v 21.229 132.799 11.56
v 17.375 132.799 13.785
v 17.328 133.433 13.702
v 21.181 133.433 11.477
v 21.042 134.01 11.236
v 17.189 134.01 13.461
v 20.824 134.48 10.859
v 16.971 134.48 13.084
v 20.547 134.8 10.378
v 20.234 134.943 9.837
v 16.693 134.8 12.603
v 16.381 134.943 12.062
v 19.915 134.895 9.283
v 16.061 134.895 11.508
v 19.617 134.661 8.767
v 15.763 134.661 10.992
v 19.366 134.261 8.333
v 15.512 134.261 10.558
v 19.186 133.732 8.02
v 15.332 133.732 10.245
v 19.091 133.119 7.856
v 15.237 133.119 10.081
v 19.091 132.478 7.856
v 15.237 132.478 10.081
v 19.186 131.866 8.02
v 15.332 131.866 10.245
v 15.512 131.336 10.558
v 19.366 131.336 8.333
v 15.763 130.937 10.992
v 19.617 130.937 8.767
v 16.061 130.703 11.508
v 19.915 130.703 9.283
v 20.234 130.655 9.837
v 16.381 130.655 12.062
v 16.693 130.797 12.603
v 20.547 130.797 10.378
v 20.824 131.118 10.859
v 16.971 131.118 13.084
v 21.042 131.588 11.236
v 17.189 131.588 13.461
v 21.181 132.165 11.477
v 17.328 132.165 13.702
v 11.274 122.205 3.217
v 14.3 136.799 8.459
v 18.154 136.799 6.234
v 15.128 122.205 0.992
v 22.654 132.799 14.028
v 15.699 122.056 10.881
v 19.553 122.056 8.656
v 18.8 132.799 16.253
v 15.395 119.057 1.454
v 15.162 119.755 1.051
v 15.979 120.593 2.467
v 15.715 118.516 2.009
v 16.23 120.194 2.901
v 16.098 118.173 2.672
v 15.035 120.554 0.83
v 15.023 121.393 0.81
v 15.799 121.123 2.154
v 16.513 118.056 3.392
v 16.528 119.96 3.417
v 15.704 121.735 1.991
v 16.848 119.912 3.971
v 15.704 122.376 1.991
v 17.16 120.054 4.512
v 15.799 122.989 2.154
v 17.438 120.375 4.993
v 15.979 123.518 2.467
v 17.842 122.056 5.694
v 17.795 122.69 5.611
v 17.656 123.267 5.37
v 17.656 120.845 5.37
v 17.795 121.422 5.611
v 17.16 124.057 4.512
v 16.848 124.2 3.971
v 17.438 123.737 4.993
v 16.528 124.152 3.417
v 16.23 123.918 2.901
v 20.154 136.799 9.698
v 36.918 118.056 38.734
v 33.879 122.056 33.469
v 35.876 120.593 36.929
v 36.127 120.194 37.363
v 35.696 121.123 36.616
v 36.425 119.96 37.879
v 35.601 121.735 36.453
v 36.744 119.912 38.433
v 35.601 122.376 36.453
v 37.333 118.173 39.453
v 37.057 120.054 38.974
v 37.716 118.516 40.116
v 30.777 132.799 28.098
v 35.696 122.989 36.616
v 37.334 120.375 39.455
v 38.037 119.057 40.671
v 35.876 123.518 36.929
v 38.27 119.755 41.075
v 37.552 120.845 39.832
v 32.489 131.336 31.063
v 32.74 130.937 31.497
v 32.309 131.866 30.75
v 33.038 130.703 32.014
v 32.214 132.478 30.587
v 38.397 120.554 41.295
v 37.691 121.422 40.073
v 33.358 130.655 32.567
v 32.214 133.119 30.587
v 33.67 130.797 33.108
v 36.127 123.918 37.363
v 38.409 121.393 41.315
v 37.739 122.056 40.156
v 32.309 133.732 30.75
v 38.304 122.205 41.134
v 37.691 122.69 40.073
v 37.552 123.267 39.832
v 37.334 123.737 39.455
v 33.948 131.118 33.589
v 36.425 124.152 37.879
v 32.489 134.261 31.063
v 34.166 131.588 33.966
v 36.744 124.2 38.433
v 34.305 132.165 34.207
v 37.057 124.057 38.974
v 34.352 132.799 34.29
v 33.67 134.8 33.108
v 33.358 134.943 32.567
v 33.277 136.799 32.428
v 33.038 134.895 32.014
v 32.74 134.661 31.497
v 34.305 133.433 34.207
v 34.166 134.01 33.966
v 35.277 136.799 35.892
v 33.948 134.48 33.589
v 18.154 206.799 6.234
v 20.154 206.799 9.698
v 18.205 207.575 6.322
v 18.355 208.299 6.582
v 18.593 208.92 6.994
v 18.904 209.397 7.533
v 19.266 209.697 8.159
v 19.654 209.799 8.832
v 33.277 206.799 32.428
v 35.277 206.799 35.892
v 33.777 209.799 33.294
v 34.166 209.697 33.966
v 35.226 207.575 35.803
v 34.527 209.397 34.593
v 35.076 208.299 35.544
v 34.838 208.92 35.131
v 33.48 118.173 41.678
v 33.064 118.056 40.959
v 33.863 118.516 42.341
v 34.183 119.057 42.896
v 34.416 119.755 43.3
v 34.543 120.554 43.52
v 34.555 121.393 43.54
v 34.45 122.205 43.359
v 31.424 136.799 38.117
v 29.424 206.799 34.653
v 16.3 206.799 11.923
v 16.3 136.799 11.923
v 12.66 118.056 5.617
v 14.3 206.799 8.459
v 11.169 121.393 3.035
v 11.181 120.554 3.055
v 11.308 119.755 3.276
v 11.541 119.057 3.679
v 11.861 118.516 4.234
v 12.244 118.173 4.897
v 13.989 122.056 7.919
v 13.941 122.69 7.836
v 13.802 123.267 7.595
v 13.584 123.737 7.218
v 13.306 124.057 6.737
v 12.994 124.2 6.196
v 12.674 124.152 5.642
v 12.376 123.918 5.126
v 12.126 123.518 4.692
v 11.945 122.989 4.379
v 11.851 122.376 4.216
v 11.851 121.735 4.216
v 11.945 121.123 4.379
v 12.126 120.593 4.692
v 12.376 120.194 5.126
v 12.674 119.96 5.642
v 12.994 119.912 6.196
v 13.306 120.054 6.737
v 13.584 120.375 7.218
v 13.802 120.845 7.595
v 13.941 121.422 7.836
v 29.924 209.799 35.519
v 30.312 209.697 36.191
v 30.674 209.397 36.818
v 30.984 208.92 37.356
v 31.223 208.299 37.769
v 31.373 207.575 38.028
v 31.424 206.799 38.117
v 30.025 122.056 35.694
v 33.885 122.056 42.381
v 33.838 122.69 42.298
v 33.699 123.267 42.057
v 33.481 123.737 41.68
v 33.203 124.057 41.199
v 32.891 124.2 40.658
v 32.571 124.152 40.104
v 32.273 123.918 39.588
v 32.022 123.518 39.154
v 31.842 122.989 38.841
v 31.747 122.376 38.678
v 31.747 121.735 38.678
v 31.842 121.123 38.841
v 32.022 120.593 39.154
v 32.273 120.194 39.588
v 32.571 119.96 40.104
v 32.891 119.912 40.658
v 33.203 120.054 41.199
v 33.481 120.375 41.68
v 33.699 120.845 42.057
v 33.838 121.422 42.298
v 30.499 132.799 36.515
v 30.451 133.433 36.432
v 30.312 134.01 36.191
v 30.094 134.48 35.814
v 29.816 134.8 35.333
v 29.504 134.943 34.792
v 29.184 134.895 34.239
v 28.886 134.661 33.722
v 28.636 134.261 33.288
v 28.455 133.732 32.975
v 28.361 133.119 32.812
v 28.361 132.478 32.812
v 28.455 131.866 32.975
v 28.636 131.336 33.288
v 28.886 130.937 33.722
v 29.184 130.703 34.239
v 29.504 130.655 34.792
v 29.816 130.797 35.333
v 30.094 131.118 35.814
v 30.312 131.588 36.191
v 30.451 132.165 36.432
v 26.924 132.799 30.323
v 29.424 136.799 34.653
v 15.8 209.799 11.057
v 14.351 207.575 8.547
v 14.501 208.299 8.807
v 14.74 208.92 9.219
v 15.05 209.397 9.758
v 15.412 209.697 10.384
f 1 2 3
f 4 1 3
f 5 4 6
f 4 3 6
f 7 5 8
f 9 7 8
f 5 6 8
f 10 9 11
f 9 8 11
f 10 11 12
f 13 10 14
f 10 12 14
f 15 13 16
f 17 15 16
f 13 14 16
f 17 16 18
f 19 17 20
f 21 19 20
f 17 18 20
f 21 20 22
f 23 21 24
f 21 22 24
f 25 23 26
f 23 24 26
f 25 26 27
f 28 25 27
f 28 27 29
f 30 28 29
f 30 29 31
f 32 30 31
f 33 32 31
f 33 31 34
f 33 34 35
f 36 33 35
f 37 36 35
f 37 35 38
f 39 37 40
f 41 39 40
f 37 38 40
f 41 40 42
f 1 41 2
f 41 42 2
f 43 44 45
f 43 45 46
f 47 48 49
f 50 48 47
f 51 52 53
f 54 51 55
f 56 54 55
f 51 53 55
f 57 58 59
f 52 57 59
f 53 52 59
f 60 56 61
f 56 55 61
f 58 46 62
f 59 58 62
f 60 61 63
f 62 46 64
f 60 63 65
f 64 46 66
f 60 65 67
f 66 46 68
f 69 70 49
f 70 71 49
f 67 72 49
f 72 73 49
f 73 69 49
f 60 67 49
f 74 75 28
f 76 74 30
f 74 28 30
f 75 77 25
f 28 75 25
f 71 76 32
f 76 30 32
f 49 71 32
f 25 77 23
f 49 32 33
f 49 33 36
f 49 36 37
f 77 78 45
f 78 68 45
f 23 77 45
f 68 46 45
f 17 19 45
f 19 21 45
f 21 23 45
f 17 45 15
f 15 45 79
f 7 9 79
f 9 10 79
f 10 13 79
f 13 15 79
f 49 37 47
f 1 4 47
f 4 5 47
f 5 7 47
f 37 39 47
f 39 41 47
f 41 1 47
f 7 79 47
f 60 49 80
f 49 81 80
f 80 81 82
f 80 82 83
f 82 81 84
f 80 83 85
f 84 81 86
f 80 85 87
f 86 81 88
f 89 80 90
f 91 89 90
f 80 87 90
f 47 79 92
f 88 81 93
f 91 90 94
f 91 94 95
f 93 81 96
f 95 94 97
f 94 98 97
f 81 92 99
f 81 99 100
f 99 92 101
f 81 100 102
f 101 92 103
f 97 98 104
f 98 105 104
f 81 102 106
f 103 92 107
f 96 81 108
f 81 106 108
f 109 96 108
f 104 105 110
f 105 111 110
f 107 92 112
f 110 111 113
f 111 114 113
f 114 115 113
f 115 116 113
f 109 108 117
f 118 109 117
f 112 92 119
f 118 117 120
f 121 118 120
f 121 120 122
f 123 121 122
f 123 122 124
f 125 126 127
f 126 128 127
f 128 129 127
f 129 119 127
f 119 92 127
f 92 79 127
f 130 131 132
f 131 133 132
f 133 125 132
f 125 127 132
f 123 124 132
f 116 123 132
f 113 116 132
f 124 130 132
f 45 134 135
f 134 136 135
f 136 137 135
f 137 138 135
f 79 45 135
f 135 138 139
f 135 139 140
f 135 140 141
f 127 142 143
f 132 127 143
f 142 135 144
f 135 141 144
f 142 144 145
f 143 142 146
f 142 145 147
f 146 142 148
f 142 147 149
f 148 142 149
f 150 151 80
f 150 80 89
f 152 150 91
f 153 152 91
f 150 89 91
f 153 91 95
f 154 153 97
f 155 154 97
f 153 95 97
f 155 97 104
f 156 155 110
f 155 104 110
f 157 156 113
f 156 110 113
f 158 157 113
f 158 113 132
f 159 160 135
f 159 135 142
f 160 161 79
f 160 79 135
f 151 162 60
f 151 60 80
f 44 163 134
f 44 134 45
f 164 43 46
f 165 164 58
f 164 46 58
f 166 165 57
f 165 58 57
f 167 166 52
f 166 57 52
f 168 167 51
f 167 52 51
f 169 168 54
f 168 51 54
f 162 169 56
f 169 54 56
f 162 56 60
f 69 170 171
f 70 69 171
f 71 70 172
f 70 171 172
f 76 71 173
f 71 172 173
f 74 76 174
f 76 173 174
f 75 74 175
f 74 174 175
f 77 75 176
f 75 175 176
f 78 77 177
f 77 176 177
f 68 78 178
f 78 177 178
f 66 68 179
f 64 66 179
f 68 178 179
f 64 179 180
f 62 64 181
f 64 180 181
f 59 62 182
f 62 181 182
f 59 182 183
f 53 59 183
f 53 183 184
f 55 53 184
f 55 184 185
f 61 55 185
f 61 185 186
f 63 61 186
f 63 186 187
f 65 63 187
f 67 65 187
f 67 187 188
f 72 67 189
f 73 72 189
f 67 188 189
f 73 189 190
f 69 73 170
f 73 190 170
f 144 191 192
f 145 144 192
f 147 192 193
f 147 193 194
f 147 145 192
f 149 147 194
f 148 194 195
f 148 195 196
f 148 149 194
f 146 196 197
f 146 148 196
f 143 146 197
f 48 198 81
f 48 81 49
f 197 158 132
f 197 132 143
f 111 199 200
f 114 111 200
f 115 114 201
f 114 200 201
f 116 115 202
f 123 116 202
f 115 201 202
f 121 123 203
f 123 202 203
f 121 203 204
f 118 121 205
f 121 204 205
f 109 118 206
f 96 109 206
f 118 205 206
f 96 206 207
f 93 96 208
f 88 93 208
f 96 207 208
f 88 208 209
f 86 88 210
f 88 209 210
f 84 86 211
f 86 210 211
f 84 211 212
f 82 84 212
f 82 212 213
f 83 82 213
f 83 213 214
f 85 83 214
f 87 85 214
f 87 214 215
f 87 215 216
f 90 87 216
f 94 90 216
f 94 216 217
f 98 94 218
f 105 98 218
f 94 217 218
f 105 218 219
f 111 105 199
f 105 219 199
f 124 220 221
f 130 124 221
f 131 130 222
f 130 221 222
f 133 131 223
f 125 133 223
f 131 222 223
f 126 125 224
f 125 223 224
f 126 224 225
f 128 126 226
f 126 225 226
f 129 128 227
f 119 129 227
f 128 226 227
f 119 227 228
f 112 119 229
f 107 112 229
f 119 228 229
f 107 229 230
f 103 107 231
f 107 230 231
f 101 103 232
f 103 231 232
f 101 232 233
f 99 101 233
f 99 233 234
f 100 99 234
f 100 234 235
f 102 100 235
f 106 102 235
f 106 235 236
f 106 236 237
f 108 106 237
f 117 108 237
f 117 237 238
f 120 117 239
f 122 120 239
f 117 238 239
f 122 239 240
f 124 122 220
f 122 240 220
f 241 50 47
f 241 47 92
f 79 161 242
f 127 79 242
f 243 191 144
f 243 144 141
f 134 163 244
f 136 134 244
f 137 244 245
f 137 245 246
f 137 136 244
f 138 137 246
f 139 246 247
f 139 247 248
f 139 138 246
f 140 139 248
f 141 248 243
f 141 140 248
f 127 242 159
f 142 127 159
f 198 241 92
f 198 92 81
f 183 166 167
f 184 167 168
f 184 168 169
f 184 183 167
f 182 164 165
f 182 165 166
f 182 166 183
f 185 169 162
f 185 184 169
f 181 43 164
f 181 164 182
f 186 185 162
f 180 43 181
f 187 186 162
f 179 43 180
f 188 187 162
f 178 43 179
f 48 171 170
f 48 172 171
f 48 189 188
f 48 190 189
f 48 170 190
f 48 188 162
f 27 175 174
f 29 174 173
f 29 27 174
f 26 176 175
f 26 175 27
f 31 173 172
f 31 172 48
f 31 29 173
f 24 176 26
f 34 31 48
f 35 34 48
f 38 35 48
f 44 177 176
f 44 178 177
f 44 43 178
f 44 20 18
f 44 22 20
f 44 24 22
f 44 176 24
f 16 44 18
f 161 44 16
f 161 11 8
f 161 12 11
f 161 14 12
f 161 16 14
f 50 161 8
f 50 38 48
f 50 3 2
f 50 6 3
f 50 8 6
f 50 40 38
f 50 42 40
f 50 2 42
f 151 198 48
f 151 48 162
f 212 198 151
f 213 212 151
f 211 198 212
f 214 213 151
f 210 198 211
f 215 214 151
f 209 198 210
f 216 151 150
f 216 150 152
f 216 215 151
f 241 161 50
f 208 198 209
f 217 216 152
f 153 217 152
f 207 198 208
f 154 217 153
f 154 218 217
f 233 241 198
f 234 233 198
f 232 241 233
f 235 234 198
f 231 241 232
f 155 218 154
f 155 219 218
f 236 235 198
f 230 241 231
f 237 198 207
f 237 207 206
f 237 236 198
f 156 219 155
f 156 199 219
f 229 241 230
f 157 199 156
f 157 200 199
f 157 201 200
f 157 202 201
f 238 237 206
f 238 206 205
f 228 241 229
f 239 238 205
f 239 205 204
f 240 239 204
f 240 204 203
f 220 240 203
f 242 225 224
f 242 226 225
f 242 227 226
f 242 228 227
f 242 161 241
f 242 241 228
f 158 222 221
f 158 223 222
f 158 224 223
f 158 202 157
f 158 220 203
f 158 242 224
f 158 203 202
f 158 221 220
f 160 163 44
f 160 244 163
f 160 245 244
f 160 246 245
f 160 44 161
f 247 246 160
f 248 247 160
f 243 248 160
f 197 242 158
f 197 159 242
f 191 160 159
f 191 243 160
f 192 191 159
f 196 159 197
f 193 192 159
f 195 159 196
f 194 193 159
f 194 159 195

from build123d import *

# Parameters (mm, degrees)
SKETCH1_W           = 26.246666667
SKETCH1_H           = 70
SKETCH1_R           = 2.15
BOSS_EXTRUDE1_DEPTH = 4.45
FILLET1_R           = 3


with BuildPart() as part:
    # Sketch1 → Boss-Extrude1 (new body)
    with BuildSketch(Plane(origin=(7.062589735, 0, -4.077588085), x_dir=(0.5, 0, 0.866025404), z_dir=(-0.866025404, 0, 0.5))):
        Polygon((14.47543448, 209.798849573), (14.47543448, 136.798849573), (6.702101147, 118.055853922), (56.49543448, 118.055853922), (48.722101147, 136.798849573), (48.722101147, 209.798849573), align=None)
        with Locations((31.598767814, 171.798849573)):
            Rectangle(SKETCH1_W, SKETCH1_H, mode=Mode.SUBTRACT)
        with Locations((51.49543448, 122.055853922)):
            Circle(SKETCH1_R, mode=Mode.SUBTRACT)
        with Locations((44.722101147, 132.798849573)):
            Circle(SKETCH1_R, mode=Mode.SUBTRACT)
        with Locations((11.702101147, 122.055853922)):
            Circle(SKETCH1_R, mode=Mode.SUBTRACT)
        with Locations((18.47543448, 132.798849573)):
            Circle(SKETCH1_R, mode=Mode.SUBTRACT)
        Polygon((45.924572578, 122.055853922), (17.27296305, 122.055853922), (23.47543448, 132.798849573), (39.722101147, 132.798849573), align=None, mode=Mode.SUBTRACT)
    extrude(amount=-BOSS_EXTRUDE1_DEPTH)

    # Fillet1
    fillet1_edges = [part.edges().sort_by_distance(p)[0] for p in [
        (12.340546832, 118.055853922, 0.614101768),
        (37.237213499, 118.055853922, 43.736393373),
        (33.350546832, 209.798849573, 37.004489235),
        (16.227213499, 209.798849573, 7.346005906),
    ]]
    fillet(fillet1_edges, radius=FILLET1_R)


solid = part.part
